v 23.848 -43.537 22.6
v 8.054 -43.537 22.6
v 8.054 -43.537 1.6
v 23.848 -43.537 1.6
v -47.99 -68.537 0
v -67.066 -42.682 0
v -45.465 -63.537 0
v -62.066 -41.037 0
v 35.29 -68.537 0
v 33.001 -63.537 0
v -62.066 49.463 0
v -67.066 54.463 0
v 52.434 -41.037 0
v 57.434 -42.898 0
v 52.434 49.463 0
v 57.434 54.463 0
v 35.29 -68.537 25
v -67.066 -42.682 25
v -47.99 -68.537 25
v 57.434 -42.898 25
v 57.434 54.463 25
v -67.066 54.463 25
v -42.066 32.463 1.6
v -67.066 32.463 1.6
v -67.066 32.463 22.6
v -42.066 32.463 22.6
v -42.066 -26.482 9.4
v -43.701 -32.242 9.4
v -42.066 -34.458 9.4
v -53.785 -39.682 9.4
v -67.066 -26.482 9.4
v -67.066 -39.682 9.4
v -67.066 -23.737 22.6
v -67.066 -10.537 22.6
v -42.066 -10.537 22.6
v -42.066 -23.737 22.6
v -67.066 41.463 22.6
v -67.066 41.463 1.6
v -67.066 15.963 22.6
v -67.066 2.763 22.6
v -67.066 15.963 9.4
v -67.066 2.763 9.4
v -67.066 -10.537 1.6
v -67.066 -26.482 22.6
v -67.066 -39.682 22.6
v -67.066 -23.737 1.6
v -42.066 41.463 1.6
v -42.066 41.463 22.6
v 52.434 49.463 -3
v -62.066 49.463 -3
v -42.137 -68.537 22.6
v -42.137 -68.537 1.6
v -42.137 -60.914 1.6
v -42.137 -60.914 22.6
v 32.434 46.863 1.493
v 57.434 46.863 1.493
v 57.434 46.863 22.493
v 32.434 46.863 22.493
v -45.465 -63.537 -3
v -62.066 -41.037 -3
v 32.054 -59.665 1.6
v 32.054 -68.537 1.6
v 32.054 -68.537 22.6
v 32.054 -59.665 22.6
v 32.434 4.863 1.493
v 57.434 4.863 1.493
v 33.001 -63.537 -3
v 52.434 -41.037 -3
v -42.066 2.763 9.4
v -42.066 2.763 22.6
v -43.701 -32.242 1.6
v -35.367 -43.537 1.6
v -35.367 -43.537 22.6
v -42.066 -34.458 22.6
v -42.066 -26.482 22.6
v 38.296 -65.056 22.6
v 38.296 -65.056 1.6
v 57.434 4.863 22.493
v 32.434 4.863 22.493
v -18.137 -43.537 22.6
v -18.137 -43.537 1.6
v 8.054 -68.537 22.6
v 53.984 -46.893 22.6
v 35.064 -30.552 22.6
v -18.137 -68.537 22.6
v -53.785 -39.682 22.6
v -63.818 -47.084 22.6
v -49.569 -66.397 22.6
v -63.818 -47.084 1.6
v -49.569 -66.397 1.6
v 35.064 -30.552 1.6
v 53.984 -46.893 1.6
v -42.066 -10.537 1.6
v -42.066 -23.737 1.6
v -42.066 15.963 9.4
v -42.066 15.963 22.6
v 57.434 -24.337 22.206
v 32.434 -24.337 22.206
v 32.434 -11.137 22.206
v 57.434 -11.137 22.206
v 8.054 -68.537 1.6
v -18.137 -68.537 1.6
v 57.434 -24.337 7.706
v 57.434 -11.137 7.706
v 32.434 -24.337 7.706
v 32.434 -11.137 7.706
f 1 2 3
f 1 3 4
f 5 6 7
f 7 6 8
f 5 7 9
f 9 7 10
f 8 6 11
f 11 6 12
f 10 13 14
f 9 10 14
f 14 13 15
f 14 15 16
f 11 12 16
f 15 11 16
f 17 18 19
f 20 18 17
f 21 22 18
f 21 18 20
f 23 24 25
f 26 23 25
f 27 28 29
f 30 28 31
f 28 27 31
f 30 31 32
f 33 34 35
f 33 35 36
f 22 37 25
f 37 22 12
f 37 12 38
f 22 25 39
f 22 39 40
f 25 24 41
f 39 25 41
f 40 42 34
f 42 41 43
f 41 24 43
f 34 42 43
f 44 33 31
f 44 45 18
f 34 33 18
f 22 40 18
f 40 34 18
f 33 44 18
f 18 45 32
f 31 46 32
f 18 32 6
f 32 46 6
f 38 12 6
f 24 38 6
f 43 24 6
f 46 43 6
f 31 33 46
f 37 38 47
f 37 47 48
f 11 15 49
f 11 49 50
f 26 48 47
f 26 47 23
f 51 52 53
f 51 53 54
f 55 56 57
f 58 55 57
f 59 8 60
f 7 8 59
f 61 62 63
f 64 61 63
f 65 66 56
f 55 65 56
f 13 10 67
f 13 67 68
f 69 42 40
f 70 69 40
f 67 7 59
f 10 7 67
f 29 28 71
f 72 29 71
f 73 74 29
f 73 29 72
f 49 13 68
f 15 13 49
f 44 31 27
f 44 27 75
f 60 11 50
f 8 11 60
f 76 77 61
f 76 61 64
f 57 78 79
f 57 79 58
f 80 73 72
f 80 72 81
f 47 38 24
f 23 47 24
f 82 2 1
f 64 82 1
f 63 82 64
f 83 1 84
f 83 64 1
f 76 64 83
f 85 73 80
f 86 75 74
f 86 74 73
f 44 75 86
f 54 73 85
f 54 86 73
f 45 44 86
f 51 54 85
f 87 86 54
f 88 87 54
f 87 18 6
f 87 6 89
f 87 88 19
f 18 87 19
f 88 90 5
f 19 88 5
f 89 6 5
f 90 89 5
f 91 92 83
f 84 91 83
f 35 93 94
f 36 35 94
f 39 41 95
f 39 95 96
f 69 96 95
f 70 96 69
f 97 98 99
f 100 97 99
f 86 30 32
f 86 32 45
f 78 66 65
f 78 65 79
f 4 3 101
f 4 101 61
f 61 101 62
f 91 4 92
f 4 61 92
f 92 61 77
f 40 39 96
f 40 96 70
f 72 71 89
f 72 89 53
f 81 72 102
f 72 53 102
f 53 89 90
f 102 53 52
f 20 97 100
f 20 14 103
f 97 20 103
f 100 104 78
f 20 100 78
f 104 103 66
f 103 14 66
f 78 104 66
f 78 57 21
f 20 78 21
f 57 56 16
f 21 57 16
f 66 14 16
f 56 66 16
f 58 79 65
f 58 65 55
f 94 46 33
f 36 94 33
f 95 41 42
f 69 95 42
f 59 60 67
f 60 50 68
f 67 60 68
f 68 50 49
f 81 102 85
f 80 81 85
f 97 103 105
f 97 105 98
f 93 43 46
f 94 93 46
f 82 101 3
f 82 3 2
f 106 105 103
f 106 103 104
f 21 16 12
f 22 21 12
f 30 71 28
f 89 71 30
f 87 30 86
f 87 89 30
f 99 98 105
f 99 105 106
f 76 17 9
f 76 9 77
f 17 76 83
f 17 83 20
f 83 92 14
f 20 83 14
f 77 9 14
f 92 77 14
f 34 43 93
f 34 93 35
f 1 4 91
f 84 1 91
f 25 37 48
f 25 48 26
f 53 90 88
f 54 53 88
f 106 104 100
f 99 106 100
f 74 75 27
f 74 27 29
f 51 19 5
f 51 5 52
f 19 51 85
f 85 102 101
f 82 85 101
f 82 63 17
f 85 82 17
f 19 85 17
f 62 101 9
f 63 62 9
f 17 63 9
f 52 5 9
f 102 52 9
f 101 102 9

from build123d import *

# Parameters (mm, degrees)
F1_DEPTH  = 3
F3_DEPTH  = 25
F4_W      = 13.2
F4_H      = 14.5
F4_W_2    = 42
F4_H_2    = 21
F5_DEPTH  = 25
F6_W      = 24
F6_H      = 21
F7_DEPTH  = 25
F8_W      = 24
F8_H      = 21
F9_DEPTH  = 25
F10_W     = 24
F10_H     = 21
F11_DEPTH = 25
F12_W     = 9
F12_H     = 21
F12_W_2   = 13.2
F12_H_2   = 13.2
F13_DEPTH = 25


with BuildPart() as f1:
    # F0 (on Top) → F1 (new body)
    with BuildSketch(Plane.XY):
        Polygon((52.4343535528, 49.4626009114), (-62.0656464472, 49.4626009114), (-62.0656464472, -41.0373990886), (-45.4653799534, -63.5373990886), (33.0013521016, -63.5373990886), (52.4343535528, -41.0373990886), align=None)
    extrude(amount=-F1_DEPTH)

    # F2 (on face) → F3 (join)
    with BuildSketch(Plane.XY):
        Polygon((52.4343535528, 54.4626009114), (-62.0656464472, 54.4626009114), (-67.0656464472, 54.4626009114), (-67.0656464472, -42.682259346), (-47.9899926711, -68.5373990886), (35.2896436851, -68.5373990886), (57.4343535528, -42.8977173713), (57.4343535528, 54.4626009114), align=None)
    extrude(amount=F3_DEPTH)

    # F4 (on face) → F5 (cut)
    with BuildSketch(Plane.YZ.offset(57.4343535528)):
        with Locations((-17.7373990886, 14.955594413)):
            Rectangle(F4_W, F4_H)
        with Locations((25.8626009114, 11.9932589587)):
            Rectangle(F4_W_2, F4_H_2)
    extrude(amount=-F5_DEPTH, mode=Mode.SUBTRACT)

    # F6 (on face) → F7 (cut)
    with BuildSketch(Plane(origin=(54.1161959556, -46.7395606462, 0), x_dir=(0.6536426668, 0.7568033193, 0), z_dir=(0.7568033193, -0.6536426668, 0))):
        with Locations((-12.2025143201, 12.1)):
            Rectangle(F6_W, F6_H)
    extrude(amount=-F7_DEPTH, mode=Mode.SUBTRACT)

    # F8 (on face) → F9 (cut)
    with BuildSketch(Plane.XZ.offset(68.5373990886)):
        with Locations((-30.1374887228, 12.1)):
            Rectangle(F8_W, F8_H)
        with Locations((20.0539599173, 12.1)):
            Rectangle(F8_W, F8_H)
    extrude(amount=-F9_DEPTH, mode=Mode.SUBTRACT)

    # F10 (on face) → F11 (cut)
    with BuildSketch(Plane(origin=(-63.8179335995, -47.0842091039, 0), x_dir=(0.5936930871, -0.8046915672, 0), z_dir=(-0.8046915672, -0.5936930871, 0))):
        with Locations((12, 12.1)):
            Rectangle(F10_W, F10_H)
    extrude(amount=-F11_DEPTH, mode=Mode.SUBTRACT)

    # F12 (on face) → F13 (cut)
    with BuildSketch(Plane(origin=(-67.0656464472, 0, 0), x_dir=(0, -1, 0), z_dir=(-1, 0, 0))):
        with Locations((-36.9626009114, 12.1)):
            Rectangle(F12_W, F12_H)
        with Locations((-9.3626009114, 16)):
            Rectangle(F12_W_2, F12_H_2)
        with Locations((17.1373990886, 12.1)):
            Rectangle(F12_W_2, F12_H)
        with Locations((33.082259346, 16)):
            Rectangle(F12_W_2, F12_H_2)
    extrude(amount=-F13_DEPTH, mode=Mode.SUBTRACT)


solid = f1.part
